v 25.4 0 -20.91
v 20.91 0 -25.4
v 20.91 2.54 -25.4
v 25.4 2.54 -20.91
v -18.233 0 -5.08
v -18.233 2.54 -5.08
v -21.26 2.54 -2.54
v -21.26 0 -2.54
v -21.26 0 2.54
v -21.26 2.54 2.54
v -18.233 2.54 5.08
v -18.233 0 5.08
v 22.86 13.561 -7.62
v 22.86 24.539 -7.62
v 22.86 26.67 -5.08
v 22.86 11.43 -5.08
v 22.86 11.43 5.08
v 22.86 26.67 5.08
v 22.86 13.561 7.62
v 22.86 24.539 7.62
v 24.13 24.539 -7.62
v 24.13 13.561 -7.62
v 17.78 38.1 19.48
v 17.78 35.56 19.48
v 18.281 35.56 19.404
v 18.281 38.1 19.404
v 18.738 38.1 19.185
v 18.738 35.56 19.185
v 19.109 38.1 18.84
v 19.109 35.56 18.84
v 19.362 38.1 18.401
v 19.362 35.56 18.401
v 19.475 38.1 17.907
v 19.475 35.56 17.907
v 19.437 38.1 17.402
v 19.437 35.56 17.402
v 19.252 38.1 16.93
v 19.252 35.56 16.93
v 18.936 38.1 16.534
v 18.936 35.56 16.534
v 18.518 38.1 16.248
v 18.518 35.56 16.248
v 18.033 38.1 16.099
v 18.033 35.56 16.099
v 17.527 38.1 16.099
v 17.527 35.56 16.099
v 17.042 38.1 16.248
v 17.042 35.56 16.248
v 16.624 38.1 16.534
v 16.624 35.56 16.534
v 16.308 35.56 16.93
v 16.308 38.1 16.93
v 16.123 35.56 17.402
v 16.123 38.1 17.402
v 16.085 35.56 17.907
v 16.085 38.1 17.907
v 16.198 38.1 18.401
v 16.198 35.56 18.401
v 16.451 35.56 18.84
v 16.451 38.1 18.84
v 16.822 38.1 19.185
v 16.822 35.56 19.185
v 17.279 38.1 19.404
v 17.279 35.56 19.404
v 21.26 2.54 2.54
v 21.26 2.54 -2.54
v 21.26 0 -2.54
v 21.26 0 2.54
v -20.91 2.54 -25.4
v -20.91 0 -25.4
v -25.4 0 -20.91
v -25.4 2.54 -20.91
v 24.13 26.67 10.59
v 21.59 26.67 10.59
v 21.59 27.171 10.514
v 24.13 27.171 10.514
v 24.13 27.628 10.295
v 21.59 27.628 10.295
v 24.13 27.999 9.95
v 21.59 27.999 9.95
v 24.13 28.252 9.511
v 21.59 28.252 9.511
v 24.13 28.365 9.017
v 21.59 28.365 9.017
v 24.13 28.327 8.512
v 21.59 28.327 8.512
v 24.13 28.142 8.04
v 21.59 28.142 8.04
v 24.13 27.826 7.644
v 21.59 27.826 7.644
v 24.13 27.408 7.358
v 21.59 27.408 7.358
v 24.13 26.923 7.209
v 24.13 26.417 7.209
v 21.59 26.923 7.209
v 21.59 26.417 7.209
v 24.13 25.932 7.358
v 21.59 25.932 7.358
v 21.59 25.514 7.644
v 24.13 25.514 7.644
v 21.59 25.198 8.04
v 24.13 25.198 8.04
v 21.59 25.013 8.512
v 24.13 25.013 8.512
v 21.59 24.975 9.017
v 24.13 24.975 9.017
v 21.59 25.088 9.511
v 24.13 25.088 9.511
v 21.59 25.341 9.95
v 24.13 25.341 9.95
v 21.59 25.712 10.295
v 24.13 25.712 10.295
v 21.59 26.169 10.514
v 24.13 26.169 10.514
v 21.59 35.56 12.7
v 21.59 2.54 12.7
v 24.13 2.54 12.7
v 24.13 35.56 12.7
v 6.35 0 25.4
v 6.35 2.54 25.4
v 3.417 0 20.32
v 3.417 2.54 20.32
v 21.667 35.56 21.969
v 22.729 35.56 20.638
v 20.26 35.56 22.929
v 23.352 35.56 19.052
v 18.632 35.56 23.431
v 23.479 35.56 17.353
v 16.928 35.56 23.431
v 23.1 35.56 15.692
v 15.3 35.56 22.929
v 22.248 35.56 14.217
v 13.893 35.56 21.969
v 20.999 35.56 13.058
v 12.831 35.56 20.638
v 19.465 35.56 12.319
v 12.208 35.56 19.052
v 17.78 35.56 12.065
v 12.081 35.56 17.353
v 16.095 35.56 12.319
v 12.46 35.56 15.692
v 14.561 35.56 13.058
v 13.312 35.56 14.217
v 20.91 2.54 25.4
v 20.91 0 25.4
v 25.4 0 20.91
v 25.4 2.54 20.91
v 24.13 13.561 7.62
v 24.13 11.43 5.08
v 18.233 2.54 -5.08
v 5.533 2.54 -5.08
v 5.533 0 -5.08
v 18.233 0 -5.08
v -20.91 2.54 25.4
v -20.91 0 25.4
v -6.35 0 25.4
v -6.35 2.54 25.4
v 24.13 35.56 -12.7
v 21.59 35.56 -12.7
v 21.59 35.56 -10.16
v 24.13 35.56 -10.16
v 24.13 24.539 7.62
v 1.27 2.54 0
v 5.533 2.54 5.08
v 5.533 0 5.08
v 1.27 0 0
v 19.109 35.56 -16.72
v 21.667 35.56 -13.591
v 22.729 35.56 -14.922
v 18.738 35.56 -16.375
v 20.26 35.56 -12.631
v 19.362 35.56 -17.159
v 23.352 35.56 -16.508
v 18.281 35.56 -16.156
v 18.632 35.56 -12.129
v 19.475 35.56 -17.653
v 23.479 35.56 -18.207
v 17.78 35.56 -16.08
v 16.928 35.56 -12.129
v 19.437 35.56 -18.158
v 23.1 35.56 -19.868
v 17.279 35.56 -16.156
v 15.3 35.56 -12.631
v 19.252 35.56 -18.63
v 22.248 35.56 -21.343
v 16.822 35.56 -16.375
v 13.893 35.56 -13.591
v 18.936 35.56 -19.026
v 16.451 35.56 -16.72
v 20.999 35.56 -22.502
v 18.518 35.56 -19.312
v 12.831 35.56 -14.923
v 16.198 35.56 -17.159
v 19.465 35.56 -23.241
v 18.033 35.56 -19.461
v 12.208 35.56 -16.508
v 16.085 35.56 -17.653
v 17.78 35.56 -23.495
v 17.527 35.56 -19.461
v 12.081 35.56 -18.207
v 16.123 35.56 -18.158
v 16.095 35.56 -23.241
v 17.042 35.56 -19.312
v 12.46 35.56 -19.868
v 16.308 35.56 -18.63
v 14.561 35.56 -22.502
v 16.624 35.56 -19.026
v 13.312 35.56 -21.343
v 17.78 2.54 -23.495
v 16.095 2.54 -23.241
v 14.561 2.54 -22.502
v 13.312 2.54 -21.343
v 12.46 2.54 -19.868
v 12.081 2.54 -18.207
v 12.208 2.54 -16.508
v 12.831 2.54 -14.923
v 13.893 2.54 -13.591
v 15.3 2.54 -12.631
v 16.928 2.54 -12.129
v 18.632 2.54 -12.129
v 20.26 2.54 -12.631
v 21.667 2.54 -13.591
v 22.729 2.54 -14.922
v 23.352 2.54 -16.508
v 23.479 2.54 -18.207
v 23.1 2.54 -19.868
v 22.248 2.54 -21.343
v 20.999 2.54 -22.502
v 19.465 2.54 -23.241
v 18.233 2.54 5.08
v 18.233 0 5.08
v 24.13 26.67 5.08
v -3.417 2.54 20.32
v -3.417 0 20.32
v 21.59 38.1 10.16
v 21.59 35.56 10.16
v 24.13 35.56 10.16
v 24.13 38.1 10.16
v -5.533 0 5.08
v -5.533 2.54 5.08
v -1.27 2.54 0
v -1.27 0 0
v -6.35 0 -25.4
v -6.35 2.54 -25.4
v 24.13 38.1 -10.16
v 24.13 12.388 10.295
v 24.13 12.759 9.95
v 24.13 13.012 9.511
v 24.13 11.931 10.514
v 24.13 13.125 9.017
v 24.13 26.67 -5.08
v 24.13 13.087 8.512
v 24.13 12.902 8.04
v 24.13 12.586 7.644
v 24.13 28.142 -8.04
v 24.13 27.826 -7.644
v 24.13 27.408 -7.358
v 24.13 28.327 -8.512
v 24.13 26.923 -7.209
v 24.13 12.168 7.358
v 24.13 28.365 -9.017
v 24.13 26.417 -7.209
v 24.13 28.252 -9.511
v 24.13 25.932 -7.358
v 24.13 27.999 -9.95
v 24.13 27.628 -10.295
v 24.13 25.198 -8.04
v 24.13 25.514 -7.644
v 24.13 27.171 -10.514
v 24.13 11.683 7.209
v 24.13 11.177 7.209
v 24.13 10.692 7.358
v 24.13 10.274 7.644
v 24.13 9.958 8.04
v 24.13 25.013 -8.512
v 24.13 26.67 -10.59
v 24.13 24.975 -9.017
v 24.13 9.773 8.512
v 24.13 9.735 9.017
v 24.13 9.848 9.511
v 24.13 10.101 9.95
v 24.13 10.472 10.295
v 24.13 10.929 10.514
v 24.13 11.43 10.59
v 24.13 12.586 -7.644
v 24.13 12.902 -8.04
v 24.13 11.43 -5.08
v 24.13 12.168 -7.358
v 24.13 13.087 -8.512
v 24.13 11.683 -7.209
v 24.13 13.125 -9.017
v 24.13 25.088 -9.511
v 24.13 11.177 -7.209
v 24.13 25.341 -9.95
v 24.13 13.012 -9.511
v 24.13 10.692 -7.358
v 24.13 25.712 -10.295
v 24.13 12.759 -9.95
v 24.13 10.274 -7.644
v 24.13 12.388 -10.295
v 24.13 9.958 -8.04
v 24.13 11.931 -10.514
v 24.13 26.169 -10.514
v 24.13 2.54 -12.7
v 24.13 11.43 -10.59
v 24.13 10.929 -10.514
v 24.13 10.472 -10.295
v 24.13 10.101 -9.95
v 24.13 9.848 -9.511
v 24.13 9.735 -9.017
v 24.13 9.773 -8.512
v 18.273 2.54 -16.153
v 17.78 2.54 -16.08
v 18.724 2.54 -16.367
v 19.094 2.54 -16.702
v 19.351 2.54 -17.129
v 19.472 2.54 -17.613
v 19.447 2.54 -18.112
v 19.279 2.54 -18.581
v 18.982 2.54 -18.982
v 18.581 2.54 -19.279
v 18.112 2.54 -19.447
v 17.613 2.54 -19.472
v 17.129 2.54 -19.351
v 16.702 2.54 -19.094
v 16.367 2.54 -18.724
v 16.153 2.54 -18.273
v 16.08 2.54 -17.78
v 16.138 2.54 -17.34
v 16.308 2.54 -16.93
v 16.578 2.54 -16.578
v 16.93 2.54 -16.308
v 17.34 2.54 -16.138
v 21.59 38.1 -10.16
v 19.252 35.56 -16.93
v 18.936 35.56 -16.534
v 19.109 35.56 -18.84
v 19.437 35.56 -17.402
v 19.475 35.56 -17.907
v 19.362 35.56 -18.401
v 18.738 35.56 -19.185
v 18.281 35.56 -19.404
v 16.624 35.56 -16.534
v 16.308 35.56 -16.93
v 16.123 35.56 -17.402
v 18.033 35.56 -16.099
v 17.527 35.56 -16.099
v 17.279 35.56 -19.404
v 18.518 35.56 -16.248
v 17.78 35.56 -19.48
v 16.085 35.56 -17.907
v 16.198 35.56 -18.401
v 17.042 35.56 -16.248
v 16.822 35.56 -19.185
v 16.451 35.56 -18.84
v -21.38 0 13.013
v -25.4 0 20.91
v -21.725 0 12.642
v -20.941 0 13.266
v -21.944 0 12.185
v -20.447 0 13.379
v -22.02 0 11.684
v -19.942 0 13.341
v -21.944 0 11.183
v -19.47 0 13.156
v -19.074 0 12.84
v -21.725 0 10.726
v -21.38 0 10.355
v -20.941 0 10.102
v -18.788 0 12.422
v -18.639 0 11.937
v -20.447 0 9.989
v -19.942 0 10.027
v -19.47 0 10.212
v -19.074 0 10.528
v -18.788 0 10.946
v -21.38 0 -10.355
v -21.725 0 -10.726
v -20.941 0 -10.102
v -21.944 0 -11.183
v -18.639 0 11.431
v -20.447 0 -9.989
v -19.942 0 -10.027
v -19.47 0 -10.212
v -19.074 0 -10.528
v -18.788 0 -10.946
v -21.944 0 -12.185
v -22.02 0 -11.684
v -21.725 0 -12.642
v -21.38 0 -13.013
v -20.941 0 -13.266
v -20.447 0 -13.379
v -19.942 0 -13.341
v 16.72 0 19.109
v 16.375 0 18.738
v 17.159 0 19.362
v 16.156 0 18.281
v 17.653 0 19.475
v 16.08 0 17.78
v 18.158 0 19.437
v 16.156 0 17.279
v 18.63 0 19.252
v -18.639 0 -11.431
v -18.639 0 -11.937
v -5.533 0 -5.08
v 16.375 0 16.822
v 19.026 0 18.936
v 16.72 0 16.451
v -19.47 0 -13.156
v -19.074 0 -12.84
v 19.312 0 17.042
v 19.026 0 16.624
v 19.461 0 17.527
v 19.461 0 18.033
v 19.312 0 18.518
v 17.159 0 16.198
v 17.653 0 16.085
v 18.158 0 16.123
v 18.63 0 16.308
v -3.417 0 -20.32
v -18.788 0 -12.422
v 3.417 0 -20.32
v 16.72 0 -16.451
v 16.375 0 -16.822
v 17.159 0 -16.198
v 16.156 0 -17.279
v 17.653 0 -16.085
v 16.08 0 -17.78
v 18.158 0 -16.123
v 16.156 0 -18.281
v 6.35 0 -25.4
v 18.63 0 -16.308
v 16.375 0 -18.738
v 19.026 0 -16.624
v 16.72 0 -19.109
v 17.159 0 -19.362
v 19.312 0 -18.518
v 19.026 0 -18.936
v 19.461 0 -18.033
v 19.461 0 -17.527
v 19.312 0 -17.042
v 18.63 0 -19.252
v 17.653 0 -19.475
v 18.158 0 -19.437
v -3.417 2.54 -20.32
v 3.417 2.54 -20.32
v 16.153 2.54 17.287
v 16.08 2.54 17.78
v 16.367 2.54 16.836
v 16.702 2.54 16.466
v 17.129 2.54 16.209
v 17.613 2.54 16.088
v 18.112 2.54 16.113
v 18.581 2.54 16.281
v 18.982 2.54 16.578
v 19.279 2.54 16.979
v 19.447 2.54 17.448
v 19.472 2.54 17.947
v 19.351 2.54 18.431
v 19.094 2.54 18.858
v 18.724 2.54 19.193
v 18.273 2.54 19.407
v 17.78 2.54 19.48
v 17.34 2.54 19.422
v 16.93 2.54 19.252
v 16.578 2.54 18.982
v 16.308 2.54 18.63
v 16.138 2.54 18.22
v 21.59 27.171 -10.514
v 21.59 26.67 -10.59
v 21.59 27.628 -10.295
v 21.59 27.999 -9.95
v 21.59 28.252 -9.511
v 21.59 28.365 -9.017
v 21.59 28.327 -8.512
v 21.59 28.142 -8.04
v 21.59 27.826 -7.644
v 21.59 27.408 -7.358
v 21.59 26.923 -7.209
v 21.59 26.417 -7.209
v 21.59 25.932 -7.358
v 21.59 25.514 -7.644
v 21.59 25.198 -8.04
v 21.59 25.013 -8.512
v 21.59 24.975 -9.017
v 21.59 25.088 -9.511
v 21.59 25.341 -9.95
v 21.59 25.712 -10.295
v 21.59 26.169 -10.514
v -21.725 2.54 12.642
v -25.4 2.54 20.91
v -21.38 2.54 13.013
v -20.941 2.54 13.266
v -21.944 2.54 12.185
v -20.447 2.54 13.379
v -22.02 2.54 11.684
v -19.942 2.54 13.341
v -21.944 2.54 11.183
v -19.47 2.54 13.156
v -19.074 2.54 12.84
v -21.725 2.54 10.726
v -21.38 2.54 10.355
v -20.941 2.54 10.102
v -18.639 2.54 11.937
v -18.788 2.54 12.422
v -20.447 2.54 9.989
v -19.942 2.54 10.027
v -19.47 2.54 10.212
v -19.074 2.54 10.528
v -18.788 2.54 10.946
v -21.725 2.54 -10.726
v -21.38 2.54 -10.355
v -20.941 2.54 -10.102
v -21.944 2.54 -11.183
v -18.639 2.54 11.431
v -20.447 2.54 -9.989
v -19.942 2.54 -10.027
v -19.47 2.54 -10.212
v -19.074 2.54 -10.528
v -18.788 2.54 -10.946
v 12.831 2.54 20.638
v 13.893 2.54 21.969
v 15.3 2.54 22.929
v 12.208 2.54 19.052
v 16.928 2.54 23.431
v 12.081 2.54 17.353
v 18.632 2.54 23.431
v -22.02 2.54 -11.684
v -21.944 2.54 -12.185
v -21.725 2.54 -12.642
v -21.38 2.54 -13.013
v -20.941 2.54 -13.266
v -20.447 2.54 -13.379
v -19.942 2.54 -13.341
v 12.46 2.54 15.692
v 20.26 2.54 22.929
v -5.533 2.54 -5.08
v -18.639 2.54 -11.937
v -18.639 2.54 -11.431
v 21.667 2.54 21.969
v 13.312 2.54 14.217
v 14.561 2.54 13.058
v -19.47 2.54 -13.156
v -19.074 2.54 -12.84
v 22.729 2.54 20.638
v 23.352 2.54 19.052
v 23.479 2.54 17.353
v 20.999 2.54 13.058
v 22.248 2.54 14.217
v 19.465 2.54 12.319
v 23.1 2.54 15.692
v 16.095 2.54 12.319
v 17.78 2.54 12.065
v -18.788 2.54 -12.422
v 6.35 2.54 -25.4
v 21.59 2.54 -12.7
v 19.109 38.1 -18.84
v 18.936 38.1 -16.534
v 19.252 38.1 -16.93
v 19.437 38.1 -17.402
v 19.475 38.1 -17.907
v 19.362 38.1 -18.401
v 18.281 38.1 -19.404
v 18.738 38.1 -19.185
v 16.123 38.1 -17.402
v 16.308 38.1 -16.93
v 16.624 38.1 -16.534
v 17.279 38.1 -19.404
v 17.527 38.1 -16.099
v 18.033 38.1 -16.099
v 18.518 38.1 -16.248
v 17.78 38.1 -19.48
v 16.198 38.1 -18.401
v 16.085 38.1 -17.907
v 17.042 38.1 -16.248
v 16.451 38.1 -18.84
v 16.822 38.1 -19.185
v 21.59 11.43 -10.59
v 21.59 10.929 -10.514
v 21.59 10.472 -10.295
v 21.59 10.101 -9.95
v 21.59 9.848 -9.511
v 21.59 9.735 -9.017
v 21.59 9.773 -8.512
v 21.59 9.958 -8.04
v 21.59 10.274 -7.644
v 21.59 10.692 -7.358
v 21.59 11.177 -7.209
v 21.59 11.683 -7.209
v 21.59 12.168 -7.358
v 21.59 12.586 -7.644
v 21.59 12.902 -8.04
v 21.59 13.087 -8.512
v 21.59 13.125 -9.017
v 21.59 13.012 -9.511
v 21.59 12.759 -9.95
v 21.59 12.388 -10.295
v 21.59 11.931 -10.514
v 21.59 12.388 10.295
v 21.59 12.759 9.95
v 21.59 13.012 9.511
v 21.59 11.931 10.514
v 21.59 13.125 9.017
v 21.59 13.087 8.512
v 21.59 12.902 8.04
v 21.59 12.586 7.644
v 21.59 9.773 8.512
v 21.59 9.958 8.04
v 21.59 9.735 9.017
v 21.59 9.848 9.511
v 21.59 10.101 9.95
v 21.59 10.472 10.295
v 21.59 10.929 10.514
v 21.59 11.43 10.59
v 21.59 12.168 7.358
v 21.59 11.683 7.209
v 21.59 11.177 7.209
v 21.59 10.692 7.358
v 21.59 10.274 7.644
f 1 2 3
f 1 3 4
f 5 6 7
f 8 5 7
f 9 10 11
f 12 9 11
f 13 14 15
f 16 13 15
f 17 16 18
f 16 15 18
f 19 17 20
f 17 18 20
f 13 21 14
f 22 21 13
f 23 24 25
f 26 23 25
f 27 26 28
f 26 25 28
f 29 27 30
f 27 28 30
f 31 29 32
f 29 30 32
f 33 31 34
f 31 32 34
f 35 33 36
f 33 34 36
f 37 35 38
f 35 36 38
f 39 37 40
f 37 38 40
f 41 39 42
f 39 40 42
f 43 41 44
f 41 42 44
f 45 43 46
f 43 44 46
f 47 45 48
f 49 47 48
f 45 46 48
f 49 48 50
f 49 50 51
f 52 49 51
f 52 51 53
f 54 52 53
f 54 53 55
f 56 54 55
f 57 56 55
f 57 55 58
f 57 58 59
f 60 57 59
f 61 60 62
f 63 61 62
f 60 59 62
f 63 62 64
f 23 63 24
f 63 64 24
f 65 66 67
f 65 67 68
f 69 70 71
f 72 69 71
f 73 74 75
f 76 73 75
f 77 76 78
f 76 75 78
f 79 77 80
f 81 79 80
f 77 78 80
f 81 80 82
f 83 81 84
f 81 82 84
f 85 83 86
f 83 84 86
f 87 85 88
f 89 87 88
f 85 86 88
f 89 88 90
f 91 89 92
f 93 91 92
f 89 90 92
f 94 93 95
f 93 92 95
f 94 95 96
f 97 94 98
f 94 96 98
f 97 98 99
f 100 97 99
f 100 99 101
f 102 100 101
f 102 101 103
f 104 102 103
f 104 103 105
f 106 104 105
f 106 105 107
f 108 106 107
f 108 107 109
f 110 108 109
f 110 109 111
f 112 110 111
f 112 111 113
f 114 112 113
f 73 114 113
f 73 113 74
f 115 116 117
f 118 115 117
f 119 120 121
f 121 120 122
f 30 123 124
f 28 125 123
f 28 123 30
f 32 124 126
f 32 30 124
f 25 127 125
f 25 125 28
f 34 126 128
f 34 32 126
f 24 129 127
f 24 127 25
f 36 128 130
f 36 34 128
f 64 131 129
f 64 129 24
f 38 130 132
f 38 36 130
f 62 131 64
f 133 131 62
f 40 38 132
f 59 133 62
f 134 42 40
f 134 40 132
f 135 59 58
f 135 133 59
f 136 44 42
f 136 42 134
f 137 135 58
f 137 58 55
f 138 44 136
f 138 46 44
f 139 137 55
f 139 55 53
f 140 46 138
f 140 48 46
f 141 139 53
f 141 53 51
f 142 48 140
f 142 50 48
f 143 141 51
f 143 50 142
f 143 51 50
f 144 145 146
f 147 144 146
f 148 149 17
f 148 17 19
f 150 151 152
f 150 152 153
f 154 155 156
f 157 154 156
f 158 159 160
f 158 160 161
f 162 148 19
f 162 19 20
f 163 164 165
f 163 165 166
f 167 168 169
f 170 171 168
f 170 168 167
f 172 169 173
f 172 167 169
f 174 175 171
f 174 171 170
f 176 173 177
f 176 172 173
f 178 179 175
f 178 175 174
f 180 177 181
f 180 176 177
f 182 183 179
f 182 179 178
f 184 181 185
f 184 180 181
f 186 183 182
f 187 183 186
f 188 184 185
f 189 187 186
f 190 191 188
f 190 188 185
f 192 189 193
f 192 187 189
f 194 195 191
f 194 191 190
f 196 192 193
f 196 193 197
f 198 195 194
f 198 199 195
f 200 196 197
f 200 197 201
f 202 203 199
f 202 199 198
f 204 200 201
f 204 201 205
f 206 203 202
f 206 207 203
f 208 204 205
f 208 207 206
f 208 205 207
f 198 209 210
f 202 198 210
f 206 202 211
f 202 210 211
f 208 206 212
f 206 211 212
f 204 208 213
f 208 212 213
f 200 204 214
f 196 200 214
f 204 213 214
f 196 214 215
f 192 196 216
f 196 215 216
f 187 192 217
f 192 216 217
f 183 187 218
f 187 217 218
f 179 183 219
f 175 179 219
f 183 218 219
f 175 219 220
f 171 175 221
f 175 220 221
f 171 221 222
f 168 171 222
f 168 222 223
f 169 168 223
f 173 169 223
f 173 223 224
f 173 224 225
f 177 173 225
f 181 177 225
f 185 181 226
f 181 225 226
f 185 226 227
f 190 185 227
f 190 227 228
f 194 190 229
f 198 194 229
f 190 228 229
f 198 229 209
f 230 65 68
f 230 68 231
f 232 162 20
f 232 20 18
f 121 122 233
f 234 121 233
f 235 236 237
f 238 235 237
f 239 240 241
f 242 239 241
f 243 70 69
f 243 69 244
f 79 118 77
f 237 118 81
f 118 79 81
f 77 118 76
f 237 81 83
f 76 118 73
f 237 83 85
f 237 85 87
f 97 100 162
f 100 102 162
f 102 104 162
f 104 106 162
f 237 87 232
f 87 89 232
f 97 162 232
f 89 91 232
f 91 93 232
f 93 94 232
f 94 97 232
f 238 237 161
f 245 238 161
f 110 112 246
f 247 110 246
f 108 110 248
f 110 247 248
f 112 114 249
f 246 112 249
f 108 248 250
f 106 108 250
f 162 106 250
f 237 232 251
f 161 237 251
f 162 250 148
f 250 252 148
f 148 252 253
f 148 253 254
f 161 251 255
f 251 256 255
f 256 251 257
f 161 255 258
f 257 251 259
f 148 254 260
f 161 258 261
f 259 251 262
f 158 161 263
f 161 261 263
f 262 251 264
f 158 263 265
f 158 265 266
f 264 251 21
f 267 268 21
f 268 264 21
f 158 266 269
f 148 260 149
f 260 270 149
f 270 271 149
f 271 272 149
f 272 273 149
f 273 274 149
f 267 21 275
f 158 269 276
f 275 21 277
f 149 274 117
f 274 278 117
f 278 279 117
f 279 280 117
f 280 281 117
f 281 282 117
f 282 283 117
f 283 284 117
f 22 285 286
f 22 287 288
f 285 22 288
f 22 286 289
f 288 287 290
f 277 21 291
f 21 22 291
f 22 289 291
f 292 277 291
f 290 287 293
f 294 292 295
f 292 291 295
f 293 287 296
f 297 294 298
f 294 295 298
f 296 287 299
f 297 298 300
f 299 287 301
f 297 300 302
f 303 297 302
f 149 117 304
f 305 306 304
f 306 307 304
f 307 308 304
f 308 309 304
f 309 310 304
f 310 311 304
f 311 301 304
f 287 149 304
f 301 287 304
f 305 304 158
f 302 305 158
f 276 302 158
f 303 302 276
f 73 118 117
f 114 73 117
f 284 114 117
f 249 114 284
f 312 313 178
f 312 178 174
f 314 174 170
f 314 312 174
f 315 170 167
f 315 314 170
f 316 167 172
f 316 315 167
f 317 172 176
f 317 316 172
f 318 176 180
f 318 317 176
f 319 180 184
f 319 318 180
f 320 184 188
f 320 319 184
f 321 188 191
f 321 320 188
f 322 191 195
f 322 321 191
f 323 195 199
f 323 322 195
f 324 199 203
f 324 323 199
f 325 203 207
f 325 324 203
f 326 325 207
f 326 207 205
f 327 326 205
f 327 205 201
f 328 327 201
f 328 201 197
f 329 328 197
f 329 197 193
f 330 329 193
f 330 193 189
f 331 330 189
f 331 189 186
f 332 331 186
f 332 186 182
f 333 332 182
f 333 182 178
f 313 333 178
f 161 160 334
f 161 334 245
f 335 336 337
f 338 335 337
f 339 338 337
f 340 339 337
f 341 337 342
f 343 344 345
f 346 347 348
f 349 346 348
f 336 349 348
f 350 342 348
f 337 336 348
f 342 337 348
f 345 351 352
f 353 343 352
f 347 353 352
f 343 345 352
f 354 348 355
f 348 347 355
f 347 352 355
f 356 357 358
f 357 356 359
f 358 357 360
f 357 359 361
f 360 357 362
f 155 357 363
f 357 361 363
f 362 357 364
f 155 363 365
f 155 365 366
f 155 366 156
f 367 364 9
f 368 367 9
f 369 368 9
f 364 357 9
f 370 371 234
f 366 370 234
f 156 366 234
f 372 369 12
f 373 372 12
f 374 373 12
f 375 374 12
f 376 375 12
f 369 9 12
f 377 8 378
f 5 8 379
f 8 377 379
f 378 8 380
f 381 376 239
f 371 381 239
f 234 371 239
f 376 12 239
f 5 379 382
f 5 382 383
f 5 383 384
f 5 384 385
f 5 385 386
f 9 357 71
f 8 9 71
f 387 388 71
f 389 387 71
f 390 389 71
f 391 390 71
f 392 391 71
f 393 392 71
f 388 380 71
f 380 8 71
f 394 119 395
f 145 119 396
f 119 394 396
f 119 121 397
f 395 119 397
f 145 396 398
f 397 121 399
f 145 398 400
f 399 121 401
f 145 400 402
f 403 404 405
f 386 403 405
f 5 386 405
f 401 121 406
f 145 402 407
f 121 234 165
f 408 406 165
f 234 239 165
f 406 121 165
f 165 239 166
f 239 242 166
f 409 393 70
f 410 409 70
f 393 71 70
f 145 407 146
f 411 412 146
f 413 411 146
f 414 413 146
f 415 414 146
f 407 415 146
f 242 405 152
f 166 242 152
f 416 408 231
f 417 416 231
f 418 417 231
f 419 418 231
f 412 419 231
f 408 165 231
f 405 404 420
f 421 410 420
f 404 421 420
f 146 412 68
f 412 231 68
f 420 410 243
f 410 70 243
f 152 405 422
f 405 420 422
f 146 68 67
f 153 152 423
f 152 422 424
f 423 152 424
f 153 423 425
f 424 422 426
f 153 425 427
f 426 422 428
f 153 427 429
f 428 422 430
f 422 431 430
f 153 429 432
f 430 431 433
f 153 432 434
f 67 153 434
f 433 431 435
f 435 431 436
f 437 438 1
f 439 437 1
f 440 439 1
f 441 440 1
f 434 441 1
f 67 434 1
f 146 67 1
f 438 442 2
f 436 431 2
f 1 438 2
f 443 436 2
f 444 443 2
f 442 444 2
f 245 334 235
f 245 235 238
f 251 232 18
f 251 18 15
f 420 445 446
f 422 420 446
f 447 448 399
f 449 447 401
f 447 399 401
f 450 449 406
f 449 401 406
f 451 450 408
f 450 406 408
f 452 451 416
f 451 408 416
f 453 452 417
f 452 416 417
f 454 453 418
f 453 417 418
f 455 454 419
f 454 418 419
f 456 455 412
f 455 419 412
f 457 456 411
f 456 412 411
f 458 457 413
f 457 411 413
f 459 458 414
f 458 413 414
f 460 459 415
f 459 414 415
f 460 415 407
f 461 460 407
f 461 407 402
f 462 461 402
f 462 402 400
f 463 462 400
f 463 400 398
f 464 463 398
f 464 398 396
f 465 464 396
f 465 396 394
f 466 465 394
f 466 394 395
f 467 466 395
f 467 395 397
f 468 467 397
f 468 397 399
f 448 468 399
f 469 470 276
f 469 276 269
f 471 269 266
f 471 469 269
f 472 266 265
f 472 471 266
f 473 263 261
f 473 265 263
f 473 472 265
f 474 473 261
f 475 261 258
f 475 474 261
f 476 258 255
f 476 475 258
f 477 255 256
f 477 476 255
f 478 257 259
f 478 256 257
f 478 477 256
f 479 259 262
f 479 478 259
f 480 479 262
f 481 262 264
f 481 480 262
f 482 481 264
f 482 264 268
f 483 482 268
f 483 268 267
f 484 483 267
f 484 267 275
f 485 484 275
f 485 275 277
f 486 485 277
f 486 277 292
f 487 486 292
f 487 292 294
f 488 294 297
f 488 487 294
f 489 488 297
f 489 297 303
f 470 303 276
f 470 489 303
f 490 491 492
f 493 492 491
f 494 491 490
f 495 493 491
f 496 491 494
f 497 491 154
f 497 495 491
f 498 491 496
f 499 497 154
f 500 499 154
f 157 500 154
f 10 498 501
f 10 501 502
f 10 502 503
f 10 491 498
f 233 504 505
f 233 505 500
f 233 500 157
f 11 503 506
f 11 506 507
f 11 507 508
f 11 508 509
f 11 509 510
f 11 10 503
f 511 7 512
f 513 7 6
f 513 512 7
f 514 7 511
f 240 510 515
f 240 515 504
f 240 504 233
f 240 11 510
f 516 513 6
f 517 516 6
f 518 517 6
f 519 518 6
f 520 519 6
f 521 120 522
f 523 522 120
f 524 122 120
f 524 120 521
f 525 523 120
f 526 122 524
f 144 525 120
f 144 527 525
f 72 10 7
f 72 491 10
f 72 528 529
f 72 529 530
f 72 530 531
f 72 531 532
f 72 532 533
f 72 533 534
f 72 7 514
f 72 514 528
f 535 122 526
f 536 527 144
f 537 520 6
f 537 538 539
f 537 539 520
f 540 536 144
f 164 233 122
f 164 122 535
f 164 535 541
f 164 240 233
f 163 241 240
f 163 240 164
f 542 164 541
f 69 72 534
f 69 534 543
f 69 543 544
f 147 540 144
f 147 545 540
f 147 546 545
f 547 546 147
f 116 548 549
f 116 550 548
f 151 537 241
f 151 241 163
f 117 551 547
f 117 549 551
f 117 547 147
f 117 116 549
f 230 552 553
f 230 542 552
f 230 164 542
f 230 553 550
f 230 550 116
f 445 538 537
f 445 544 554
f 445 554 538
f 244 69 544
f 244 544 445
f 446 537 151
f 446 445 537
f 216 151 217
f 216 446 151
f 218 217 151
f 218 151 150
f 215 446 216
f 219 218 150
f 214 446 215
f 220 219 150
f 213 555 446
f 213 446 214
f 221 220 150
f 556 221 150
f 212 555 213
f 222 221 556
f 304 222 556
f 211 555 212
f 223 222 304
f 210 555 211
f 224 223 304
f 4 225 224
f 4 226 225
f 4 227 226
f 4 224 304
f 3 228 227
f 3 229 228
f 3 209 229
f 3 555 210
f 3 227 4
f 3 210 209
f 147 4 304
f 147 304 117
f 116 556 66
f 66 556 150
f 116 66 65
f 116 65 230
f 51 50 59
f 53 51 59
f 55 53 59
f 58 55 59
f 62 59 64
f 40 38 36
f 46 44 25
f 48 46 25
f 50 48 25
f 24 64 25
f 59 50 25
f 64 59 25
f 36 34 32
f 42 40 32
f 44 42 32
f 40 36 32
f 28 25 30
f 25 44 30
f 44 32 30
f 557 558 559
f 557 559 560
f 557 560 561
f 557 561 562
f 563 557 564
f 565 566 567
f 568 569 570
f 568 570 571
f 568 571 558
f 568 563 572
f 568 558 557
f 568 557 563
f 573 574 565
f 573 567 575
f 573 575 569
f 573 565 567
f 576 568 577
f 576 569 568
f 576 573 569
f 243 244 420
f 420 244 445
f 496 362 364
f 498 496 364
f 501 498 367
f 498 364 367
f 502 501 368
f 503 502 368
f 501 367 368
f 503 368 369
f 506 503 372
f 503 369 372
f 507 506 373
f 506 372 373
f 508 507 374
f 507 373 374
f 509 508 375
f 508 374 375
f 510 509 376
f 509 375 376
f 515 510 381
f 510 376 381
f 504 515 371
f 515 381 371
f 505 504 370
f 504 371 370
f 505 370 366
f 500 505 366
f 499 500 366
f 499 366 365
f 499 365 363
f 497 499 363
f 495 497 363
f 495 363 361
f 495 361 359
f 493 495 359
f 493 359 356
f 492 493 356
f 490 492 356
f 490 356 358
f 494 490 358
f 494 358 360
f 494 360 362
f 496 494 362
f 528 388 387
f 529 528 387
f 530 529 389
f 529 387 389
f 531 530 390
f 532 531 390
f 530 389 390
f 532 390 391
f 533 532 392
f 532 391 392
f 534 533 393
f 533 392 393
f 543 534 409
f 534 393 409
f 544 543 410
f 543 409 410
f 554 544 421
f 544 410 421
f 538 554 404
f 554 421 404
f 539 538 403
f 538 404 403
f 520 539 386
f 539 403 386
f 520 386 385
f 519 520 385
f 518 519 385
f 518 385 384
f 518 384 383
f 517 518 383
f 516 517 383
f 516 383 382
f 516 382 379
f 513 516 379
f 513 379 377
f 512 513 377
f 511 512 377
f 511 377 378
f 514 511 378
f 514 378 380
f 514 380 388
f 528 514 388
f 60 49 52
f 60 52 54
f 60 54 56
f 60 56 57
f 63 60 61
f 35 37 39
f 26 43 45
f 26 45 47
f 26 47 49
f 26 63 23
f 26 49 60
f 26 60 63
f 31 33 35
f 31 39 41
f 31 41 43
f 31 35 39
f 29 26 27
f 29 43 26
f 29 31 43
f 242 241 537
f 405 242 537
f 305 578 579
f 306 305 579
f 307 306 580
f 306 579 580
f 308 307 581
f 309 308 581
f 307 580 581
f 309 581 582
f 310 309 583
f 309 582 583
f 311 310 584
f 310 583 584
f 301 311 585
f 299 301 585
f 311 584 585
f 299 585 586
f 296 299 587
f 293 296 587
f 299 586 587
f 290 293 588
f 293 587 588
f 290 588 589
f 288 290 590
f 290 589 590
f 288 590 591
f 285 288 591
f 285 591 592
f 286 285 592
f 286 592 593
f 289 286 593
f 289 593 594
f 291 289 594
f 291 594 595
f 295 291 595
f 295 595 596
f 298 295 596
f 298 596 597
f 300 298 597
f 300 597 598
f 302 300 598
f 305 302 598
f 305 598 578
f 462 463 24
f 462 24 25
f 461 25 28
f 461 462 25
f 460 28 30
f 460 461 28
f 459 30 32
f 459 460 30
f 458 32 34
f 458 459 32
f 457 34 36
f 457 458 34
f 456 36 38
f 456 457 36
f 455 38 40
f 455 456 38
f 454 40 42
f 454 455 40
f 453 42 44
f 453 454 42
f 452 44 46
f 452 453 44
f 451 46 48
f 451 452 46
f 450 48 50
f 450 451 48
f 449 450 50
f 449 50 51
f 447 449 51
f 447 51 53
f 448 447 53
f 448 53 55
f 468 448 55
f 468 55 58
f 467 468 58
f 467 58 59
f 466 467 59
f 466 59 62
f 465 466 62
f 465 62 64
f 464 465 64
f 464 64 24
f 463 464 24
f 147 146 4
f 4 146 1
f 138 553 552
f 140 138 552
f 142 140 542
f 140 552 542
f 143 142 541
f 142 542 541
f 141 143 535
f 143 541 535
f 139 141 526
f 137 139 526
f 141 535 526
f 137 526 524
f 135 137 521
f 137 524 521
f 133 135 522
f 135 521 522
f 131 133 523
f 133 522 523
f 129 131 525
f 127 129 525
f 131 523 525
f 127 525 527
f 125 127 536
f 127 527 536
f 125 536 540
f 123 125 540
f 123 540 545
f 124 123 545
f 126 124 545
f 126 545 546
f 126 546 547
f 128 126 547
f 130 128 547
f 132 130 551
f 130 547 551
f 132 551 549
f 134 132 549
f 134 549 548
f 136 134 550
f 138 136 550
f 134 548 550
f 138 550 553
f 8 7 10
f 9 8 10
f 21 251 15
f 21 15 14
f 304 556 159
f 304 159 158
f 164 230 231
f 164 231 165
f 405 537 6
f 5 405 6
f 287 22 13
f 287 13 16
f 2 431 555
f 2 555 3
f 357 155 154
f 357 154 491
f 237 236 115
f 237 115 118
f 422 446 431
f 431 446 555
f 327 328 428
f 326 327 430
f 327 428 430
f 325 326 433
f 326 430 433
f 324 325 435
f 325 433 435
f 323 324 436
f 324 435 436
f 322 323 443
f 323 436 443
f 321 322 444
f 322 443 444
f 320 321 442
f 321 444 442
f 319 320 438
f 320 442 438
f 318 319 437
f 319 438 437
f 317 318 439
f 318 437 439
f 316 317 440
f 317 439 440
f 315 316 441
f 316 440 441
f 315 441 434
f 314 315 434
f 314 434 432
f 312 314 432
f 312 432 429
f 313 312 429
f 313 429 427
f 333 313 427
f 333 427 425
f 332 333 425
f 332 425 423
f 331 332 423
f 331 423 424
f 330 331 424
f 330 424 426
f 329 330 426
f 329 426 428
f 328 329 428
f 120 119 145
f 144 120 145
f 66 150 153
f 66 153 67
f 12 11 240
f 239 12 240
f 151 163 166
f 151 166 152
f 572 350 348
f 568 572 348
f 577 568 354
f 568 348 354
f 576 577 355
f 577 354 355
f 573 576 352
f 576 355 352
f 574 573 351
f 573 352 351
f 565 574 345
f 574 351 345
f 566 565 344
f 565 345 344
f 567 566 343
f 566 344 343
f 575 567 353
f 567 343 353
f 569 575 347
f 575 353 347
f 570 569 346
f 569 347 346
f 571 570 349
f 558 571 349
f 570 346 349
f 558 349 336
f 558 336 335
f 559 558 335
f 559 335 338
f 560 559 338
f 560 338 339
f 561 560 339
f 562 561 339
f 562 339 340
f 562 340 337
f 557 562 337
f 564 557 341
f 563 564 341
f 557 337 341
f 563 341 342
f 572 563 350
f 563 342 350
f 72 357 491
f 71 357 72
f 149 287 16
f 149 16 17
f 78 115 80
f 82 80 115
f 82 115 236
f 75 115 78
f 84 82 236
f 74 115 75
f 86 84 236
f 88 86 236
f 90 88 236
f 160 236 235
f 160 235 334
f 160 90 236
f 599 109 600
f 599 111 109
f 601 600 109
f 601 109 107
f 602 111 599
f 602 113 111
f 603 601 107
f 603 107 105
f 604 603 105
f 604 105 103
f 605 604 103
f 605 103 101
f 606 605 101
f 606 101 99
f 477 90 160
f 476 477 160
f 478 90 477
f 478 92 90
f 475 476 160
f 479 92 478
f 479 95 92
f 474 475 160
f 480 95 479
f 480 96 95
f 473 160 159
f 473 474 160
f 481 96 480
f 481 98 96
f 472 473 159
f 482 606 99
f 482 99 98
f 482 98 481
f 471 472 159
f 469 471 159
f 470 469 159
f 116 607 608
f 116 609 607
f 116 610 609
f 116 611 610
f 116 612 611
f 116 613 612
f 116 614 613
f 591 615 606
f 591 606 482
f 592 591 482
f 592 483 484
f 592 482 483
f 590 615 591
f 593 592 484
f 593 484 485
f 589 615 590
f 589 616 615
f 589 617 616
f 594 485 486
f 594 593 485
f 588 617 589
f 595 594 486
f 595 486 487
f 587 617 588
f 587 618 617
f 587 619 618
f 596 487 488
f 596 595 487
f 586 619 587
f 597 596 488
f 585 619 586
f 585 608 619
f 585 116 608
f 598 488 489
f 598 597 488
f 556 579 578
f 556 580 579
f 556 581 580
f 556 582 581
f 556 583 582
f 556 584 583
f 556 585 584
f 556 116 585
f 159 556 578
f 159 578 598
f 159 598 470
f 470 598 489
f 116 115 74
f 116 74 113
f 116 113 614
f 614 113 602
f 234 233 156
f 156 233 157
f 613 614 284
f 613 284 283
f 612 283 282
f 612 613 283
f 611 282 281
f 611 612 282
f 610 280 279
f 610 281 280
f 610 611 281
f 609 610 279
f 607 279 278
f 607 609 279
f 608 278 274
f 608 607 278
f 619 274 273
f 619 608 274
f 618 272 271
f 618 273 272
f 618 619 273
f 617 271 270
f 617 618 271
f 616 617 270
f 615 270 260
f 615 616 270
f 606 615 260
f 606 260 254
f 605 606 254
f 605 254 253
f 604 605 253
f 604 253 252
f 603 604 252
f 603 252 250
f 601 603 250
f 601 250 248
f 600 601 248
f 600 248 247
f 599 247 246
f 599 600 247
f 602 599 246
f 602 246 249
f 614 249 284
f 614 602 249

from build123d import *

# Parameters (mm, degrees)
SKETCH1_W                       = 50.8
SKETCH1_H                       = 50.8
BOSS_EXTRUDE1_DEPTH             = 2.54
HOLES_FOR_ARMS_D                = 3.4
HOLES_FOR_STRUCTURE_D           = 3.4
CORNERS_START                   = -2.54
CORNERS_DEPTH                   = 39.550715072
MIRROR_START                    = -2.54
MIRROR_OF_CORNER_2_COPY_1_DEPTH = 39.550715072
SIDE_CUTS_DEPTH                 = 2.54
CENTER_CUT_DEPTH                = 2.54
SKETCH16_R                      = 5.715
SKETCH16_R_2                    = 1.7
STANDOFFS_DEPTH                 = 33.02
SKETCH17_W                      = 2.54
SKETCH17_H                      = 25.4
BOSS_EXTRUDE2_DEPTH             = 33.02
SKETCH18_W                      = 2.54
SKETCH18_H                      = 2.54
BOSS_EXTRUDE3_DEPTH             = 2.54
CUT_EXTRUDE1_DEPTH              = 2.54
M3_CLEARANCE_HOLE1_D            = 3.4
MIRROR2_COPY_1_D                = 3.4
SKETCH23_R                      = 1.7
BOSS_EXTRUDE4_DEPTH             = 2.54
BOSS_EXTRUDE4_2_DEPTH           = 2.54
SKETCH24_W                      = 2.54
SKETCH24_H                      = 15.24
BOSS_EXTRUDE5_DEPTH             = 2.54


with BuildPart() as part:
    # Sketch1 → Boss-Extrude1 (new body)
    with BuildSketch(Plane(origin=(0, 0, 0), x_dir=(1, 0, 0), z_dir=(0, 1, 0))):
        Rectangle(SKETCH1_W, SKETCH1_H)
    extrude(amount=BOSS_EXTRUDE1_DEPTH)

    # holes for arms (through all)
    with Locations(Plane(origin=(0, 2.54, 0), x_dir=(1, 0, 0), z_dir=(0, 1, 0))):
        with Locations((-20.32, -11.684), (-20.32, 11.684)):
            Hole(HOLES_FOR_ARMS_D / 2)

    # holes for structure (through all)
    with Locations(Plane(origin=(0, 2.54, 0), x_dir=(1, 0, 0), z_dir=(0, 1, 0))):
        with Locations((17.78, -17.78), (17.78, 17.78)):
            Hole(HOLES_FOR_STRUCTURE_D / 2)

    # Sketch12 → corners (cut)
    with BuildSketch(Plane(origin=(0, 2.54, 0), x_dir=(1, 0, 0), z_dir=(0, 1, 0)).offset(CORNERS_START)):
        Polygon((-25.4, -25.4), (-20.909871939, -25.4), (-25.4, -20.909871939), align=None)
    corners = extrude(amount=CORNERS_DEPTH, mode=Mode.SUBTRACT)

    # mirror of corner: corners across plane
    add(corners.mirror(Plane.ZY), mode=Mode.SUBTRACT)

    # mirror of corner 2: corners across plane
    add(corners.mirror(Plane(origin=(0, 0, 0), x_dir=(1, 0, 0), z_dir=(0, 0, -1))), mode=Mode.SUBTRACT)

    # mirror of corner 2 copy 1 sketch → mirror of corner 2 copy 1 (cut)
    with BuildSketch(Plane(origin=(0, 2.54, 0), x_dir=(-1, 0, 0), z_dir=(0, 1, 0)).offset(MIRROR_START)):
        Polygon((-25.4, -25.4), (-20.909871939, -25.4), (-25.4, -20.909871939), align=None)
    extrude(amount=MIRROR_OF_CORNER_2_COPY_1_DEPTH, mode=Mode.SUBTRACT)

    # Sketch14 → side cuts (cut)
    with BuildSketch(Plane(origin=(0, 2.54, 0), x_dir=(1, 0, 0), z_dir=(0, 1, 0))):
        Polygon((-6.35, -25.4), (6.35, -25.4), (3.417060633, -20.32), (-3.417060633, -20.32), align=None)
        Polygon((-6.35, 25.4), (-3.417060633, 20.32), (3.417060633, 20.32), (6.35, 25.4), align=None)
    extrude(amount=-SIDE_CUTS_DEPTH, mode=Mode.SUBTRACT)

    # Sketch15 → center cut (cut)
    with BuildSketch(Plane(origin=(0, 2.54, 0), x_dir=(1, 0, 0), z_dir=(0, 1, 0))):
        Polygon((-21.259680252, 2.54), (-21.259680252, -2.54), (-18.232626126, -5.08), (-5.532626126, -5.08), (-1.27, 0), (-5.532626126, 5.08), (-18.232626126, 5.08), align=None)
    center_cut = extrude(amount=-CENTER_CUT_DEPTH, mode=Mode.SUBTRACT)

    # mirror of center cut: center cut across plane
    add(center_cut.mirror(Plane.ZY), mode=Mode.SUBTRACT)

    # Sketch16 → standoffs (add)
    # profile 1 of 2: a face of its own
    with BuildSketch(Plane(origin=(0, 2.54, 0), x_dir=(1, 0, 0), z_dir=(0, 1, 0))):
        with Locations(Location((17.78, -17.78, 0), (0, 0, 90))):
            Circle(SKETCH16_R)
        with Locations(Location((17.78, -17.78, 0), (0, 0, 270))):
            Circle(SKETCH16_R_2, mode=Mode.SUBTRACT)
    # profile 2 of 2: a face of its own
    with BuildSketch(Plane(origin=(0, 2.54, 0), x_dir=(1, 0, 0), z_dir=(0, 1, 0))):
        with Locations(Location((17.78, 17.78, 0), (0, 0, 90))):
            Circle(SKETCH16_R)
        with Locations(Location((17.78, 17.78, 0), (0, 0, 270))):
            Circle(SKETCH16_R_2, mode=Mode.SUBTRACT)
    extrude(amount=STANDOFFS_DEPTH)

    # Sketch17 → Boss-Extrude2 (add)
    with BuildSketch(Plane(origin=(0, 2.54, 0), x_dir=(1, 0, 0), z_dir=(0, 1, 0))):
        with Locations((22.86, 0)):
            Rectangle(SKETCH17_W, SKETCH17_H)
    extrude(amount=BOSS_EXTRUDE2_DEPTH)

    # Sketch18 → Boss-Extrude3 (add)
    with BuildSketch(Plane(origin=(0, 35.56, 0), x_dir=(1, 0, 0), z_dir=(0, 1, 0))):
        with Locations((22.86, -8.89)):
            Rectangle(SKETCH18_W, SKETCH18_H)
        with Locations((22.86, 8.89)):
            Rectangle(SKETCH18_W, SKETCH18_H)
    extrude(amount=BOSS_EXTRUDE3_DEPTH)

    # Sketch19 → Cut-Extrude1 (cut)
    with BuildSketch(Plane(origin=(25.4, 0, 0), x_dir=(0, 0, -1), z_dir=(1, 0, 0))):
        Polygon((-7.62, 13.561313063), (-7.62, 24.538686937), (-5.08, 26.67), (5.08, 26.67), (7.62, 24.538686937), (7.62, 13.561313063), (5.08, 11.43), (-5.08, 11.43), align=None)
    extrude(amount=-CUT_EXTRUDE1_DEPTH, mode=Mode.SUBTRACT)

    # M3 Clearance Hole1 (through all)
    with Locations(Plane(origin=(24.13, 0, 0), x_dir=(0, 0, -1), z_dir=(1, 0, 0))):
        with Locations((-8.89, 26.67)):
            m3_clearance_hole1 = Hole(M3_CLEARANCE_HOLE1_D / 2)

    # Mirror1: M3 Clearance Hole1 across plane
    add(m3_clearance_hole1.mirror(Plane(origin=(0, 0, 0), x_dir=(1, 0, 0), z_dir=(0, 0, -1))), mode=Mode.SUBTRACT)

    # Mirror2: M3 Clearance Hole1 across plane
    add(m3_clearance_hole1.mirror(Plane.ZX.offset(19.05)), mode=Mode.SUBTRACT)

    # Mirror2 copy 1 (through all)
    with Locations(Plane(origin=(24.13, 38.1, 0), x_dir=(0, 0, 1), z_dir=(1, 0, 0))):
        with Locations((-8.89, 26.67)):
            Hole(MIRROR2_COPY_1_D / 2)

    # Sketch24 → Boss-Extrude5 (add)
    with BuildSketch(Plane(origin=(0, 35.56, 0), x_dir=(1, 0, 0), z_dir=(0, 1, 0))):
        with Locations((22.86, 0)):
            Rectangle(SKETCH24_W, SKETCH24_H)
    extrude(amount=BOSS_EXTRUDE5_DEPTH)


with BuildPart() as body_2:
    # Sketch23 → Boss-Extrude4 (new body)
    with BuildSketch(Plane(origin=(0, 35.56, 0), x_dir=(1, 0, 0), z_dir=(0, 1, 0))):
        with Locations(Location((17.78, -17.78, 0), (0, 0, 270))):
            Circle(SKETCH23_R)
    extrude(amount=BOSS_EXTRUDE4_DEPTH)


with BuildPart() as body_3:
    # Sketch23 → Boss-Extrude4 2 (new body)
    with BuildSketch(Plane(origin=(0, 35.56, 0), x_dir=(1, 0, 0), z_dir=(0, 1, 0))):
        with Locations(Location((17.78, 17.78, 0), (0, 0, 90))):
            Circle(SKETCH23_R)
    extrude(amount=BOSS_EXTRUDE4_2_DEPTH)


solid = Compound([part.part, body_2.part, body_3.part])
